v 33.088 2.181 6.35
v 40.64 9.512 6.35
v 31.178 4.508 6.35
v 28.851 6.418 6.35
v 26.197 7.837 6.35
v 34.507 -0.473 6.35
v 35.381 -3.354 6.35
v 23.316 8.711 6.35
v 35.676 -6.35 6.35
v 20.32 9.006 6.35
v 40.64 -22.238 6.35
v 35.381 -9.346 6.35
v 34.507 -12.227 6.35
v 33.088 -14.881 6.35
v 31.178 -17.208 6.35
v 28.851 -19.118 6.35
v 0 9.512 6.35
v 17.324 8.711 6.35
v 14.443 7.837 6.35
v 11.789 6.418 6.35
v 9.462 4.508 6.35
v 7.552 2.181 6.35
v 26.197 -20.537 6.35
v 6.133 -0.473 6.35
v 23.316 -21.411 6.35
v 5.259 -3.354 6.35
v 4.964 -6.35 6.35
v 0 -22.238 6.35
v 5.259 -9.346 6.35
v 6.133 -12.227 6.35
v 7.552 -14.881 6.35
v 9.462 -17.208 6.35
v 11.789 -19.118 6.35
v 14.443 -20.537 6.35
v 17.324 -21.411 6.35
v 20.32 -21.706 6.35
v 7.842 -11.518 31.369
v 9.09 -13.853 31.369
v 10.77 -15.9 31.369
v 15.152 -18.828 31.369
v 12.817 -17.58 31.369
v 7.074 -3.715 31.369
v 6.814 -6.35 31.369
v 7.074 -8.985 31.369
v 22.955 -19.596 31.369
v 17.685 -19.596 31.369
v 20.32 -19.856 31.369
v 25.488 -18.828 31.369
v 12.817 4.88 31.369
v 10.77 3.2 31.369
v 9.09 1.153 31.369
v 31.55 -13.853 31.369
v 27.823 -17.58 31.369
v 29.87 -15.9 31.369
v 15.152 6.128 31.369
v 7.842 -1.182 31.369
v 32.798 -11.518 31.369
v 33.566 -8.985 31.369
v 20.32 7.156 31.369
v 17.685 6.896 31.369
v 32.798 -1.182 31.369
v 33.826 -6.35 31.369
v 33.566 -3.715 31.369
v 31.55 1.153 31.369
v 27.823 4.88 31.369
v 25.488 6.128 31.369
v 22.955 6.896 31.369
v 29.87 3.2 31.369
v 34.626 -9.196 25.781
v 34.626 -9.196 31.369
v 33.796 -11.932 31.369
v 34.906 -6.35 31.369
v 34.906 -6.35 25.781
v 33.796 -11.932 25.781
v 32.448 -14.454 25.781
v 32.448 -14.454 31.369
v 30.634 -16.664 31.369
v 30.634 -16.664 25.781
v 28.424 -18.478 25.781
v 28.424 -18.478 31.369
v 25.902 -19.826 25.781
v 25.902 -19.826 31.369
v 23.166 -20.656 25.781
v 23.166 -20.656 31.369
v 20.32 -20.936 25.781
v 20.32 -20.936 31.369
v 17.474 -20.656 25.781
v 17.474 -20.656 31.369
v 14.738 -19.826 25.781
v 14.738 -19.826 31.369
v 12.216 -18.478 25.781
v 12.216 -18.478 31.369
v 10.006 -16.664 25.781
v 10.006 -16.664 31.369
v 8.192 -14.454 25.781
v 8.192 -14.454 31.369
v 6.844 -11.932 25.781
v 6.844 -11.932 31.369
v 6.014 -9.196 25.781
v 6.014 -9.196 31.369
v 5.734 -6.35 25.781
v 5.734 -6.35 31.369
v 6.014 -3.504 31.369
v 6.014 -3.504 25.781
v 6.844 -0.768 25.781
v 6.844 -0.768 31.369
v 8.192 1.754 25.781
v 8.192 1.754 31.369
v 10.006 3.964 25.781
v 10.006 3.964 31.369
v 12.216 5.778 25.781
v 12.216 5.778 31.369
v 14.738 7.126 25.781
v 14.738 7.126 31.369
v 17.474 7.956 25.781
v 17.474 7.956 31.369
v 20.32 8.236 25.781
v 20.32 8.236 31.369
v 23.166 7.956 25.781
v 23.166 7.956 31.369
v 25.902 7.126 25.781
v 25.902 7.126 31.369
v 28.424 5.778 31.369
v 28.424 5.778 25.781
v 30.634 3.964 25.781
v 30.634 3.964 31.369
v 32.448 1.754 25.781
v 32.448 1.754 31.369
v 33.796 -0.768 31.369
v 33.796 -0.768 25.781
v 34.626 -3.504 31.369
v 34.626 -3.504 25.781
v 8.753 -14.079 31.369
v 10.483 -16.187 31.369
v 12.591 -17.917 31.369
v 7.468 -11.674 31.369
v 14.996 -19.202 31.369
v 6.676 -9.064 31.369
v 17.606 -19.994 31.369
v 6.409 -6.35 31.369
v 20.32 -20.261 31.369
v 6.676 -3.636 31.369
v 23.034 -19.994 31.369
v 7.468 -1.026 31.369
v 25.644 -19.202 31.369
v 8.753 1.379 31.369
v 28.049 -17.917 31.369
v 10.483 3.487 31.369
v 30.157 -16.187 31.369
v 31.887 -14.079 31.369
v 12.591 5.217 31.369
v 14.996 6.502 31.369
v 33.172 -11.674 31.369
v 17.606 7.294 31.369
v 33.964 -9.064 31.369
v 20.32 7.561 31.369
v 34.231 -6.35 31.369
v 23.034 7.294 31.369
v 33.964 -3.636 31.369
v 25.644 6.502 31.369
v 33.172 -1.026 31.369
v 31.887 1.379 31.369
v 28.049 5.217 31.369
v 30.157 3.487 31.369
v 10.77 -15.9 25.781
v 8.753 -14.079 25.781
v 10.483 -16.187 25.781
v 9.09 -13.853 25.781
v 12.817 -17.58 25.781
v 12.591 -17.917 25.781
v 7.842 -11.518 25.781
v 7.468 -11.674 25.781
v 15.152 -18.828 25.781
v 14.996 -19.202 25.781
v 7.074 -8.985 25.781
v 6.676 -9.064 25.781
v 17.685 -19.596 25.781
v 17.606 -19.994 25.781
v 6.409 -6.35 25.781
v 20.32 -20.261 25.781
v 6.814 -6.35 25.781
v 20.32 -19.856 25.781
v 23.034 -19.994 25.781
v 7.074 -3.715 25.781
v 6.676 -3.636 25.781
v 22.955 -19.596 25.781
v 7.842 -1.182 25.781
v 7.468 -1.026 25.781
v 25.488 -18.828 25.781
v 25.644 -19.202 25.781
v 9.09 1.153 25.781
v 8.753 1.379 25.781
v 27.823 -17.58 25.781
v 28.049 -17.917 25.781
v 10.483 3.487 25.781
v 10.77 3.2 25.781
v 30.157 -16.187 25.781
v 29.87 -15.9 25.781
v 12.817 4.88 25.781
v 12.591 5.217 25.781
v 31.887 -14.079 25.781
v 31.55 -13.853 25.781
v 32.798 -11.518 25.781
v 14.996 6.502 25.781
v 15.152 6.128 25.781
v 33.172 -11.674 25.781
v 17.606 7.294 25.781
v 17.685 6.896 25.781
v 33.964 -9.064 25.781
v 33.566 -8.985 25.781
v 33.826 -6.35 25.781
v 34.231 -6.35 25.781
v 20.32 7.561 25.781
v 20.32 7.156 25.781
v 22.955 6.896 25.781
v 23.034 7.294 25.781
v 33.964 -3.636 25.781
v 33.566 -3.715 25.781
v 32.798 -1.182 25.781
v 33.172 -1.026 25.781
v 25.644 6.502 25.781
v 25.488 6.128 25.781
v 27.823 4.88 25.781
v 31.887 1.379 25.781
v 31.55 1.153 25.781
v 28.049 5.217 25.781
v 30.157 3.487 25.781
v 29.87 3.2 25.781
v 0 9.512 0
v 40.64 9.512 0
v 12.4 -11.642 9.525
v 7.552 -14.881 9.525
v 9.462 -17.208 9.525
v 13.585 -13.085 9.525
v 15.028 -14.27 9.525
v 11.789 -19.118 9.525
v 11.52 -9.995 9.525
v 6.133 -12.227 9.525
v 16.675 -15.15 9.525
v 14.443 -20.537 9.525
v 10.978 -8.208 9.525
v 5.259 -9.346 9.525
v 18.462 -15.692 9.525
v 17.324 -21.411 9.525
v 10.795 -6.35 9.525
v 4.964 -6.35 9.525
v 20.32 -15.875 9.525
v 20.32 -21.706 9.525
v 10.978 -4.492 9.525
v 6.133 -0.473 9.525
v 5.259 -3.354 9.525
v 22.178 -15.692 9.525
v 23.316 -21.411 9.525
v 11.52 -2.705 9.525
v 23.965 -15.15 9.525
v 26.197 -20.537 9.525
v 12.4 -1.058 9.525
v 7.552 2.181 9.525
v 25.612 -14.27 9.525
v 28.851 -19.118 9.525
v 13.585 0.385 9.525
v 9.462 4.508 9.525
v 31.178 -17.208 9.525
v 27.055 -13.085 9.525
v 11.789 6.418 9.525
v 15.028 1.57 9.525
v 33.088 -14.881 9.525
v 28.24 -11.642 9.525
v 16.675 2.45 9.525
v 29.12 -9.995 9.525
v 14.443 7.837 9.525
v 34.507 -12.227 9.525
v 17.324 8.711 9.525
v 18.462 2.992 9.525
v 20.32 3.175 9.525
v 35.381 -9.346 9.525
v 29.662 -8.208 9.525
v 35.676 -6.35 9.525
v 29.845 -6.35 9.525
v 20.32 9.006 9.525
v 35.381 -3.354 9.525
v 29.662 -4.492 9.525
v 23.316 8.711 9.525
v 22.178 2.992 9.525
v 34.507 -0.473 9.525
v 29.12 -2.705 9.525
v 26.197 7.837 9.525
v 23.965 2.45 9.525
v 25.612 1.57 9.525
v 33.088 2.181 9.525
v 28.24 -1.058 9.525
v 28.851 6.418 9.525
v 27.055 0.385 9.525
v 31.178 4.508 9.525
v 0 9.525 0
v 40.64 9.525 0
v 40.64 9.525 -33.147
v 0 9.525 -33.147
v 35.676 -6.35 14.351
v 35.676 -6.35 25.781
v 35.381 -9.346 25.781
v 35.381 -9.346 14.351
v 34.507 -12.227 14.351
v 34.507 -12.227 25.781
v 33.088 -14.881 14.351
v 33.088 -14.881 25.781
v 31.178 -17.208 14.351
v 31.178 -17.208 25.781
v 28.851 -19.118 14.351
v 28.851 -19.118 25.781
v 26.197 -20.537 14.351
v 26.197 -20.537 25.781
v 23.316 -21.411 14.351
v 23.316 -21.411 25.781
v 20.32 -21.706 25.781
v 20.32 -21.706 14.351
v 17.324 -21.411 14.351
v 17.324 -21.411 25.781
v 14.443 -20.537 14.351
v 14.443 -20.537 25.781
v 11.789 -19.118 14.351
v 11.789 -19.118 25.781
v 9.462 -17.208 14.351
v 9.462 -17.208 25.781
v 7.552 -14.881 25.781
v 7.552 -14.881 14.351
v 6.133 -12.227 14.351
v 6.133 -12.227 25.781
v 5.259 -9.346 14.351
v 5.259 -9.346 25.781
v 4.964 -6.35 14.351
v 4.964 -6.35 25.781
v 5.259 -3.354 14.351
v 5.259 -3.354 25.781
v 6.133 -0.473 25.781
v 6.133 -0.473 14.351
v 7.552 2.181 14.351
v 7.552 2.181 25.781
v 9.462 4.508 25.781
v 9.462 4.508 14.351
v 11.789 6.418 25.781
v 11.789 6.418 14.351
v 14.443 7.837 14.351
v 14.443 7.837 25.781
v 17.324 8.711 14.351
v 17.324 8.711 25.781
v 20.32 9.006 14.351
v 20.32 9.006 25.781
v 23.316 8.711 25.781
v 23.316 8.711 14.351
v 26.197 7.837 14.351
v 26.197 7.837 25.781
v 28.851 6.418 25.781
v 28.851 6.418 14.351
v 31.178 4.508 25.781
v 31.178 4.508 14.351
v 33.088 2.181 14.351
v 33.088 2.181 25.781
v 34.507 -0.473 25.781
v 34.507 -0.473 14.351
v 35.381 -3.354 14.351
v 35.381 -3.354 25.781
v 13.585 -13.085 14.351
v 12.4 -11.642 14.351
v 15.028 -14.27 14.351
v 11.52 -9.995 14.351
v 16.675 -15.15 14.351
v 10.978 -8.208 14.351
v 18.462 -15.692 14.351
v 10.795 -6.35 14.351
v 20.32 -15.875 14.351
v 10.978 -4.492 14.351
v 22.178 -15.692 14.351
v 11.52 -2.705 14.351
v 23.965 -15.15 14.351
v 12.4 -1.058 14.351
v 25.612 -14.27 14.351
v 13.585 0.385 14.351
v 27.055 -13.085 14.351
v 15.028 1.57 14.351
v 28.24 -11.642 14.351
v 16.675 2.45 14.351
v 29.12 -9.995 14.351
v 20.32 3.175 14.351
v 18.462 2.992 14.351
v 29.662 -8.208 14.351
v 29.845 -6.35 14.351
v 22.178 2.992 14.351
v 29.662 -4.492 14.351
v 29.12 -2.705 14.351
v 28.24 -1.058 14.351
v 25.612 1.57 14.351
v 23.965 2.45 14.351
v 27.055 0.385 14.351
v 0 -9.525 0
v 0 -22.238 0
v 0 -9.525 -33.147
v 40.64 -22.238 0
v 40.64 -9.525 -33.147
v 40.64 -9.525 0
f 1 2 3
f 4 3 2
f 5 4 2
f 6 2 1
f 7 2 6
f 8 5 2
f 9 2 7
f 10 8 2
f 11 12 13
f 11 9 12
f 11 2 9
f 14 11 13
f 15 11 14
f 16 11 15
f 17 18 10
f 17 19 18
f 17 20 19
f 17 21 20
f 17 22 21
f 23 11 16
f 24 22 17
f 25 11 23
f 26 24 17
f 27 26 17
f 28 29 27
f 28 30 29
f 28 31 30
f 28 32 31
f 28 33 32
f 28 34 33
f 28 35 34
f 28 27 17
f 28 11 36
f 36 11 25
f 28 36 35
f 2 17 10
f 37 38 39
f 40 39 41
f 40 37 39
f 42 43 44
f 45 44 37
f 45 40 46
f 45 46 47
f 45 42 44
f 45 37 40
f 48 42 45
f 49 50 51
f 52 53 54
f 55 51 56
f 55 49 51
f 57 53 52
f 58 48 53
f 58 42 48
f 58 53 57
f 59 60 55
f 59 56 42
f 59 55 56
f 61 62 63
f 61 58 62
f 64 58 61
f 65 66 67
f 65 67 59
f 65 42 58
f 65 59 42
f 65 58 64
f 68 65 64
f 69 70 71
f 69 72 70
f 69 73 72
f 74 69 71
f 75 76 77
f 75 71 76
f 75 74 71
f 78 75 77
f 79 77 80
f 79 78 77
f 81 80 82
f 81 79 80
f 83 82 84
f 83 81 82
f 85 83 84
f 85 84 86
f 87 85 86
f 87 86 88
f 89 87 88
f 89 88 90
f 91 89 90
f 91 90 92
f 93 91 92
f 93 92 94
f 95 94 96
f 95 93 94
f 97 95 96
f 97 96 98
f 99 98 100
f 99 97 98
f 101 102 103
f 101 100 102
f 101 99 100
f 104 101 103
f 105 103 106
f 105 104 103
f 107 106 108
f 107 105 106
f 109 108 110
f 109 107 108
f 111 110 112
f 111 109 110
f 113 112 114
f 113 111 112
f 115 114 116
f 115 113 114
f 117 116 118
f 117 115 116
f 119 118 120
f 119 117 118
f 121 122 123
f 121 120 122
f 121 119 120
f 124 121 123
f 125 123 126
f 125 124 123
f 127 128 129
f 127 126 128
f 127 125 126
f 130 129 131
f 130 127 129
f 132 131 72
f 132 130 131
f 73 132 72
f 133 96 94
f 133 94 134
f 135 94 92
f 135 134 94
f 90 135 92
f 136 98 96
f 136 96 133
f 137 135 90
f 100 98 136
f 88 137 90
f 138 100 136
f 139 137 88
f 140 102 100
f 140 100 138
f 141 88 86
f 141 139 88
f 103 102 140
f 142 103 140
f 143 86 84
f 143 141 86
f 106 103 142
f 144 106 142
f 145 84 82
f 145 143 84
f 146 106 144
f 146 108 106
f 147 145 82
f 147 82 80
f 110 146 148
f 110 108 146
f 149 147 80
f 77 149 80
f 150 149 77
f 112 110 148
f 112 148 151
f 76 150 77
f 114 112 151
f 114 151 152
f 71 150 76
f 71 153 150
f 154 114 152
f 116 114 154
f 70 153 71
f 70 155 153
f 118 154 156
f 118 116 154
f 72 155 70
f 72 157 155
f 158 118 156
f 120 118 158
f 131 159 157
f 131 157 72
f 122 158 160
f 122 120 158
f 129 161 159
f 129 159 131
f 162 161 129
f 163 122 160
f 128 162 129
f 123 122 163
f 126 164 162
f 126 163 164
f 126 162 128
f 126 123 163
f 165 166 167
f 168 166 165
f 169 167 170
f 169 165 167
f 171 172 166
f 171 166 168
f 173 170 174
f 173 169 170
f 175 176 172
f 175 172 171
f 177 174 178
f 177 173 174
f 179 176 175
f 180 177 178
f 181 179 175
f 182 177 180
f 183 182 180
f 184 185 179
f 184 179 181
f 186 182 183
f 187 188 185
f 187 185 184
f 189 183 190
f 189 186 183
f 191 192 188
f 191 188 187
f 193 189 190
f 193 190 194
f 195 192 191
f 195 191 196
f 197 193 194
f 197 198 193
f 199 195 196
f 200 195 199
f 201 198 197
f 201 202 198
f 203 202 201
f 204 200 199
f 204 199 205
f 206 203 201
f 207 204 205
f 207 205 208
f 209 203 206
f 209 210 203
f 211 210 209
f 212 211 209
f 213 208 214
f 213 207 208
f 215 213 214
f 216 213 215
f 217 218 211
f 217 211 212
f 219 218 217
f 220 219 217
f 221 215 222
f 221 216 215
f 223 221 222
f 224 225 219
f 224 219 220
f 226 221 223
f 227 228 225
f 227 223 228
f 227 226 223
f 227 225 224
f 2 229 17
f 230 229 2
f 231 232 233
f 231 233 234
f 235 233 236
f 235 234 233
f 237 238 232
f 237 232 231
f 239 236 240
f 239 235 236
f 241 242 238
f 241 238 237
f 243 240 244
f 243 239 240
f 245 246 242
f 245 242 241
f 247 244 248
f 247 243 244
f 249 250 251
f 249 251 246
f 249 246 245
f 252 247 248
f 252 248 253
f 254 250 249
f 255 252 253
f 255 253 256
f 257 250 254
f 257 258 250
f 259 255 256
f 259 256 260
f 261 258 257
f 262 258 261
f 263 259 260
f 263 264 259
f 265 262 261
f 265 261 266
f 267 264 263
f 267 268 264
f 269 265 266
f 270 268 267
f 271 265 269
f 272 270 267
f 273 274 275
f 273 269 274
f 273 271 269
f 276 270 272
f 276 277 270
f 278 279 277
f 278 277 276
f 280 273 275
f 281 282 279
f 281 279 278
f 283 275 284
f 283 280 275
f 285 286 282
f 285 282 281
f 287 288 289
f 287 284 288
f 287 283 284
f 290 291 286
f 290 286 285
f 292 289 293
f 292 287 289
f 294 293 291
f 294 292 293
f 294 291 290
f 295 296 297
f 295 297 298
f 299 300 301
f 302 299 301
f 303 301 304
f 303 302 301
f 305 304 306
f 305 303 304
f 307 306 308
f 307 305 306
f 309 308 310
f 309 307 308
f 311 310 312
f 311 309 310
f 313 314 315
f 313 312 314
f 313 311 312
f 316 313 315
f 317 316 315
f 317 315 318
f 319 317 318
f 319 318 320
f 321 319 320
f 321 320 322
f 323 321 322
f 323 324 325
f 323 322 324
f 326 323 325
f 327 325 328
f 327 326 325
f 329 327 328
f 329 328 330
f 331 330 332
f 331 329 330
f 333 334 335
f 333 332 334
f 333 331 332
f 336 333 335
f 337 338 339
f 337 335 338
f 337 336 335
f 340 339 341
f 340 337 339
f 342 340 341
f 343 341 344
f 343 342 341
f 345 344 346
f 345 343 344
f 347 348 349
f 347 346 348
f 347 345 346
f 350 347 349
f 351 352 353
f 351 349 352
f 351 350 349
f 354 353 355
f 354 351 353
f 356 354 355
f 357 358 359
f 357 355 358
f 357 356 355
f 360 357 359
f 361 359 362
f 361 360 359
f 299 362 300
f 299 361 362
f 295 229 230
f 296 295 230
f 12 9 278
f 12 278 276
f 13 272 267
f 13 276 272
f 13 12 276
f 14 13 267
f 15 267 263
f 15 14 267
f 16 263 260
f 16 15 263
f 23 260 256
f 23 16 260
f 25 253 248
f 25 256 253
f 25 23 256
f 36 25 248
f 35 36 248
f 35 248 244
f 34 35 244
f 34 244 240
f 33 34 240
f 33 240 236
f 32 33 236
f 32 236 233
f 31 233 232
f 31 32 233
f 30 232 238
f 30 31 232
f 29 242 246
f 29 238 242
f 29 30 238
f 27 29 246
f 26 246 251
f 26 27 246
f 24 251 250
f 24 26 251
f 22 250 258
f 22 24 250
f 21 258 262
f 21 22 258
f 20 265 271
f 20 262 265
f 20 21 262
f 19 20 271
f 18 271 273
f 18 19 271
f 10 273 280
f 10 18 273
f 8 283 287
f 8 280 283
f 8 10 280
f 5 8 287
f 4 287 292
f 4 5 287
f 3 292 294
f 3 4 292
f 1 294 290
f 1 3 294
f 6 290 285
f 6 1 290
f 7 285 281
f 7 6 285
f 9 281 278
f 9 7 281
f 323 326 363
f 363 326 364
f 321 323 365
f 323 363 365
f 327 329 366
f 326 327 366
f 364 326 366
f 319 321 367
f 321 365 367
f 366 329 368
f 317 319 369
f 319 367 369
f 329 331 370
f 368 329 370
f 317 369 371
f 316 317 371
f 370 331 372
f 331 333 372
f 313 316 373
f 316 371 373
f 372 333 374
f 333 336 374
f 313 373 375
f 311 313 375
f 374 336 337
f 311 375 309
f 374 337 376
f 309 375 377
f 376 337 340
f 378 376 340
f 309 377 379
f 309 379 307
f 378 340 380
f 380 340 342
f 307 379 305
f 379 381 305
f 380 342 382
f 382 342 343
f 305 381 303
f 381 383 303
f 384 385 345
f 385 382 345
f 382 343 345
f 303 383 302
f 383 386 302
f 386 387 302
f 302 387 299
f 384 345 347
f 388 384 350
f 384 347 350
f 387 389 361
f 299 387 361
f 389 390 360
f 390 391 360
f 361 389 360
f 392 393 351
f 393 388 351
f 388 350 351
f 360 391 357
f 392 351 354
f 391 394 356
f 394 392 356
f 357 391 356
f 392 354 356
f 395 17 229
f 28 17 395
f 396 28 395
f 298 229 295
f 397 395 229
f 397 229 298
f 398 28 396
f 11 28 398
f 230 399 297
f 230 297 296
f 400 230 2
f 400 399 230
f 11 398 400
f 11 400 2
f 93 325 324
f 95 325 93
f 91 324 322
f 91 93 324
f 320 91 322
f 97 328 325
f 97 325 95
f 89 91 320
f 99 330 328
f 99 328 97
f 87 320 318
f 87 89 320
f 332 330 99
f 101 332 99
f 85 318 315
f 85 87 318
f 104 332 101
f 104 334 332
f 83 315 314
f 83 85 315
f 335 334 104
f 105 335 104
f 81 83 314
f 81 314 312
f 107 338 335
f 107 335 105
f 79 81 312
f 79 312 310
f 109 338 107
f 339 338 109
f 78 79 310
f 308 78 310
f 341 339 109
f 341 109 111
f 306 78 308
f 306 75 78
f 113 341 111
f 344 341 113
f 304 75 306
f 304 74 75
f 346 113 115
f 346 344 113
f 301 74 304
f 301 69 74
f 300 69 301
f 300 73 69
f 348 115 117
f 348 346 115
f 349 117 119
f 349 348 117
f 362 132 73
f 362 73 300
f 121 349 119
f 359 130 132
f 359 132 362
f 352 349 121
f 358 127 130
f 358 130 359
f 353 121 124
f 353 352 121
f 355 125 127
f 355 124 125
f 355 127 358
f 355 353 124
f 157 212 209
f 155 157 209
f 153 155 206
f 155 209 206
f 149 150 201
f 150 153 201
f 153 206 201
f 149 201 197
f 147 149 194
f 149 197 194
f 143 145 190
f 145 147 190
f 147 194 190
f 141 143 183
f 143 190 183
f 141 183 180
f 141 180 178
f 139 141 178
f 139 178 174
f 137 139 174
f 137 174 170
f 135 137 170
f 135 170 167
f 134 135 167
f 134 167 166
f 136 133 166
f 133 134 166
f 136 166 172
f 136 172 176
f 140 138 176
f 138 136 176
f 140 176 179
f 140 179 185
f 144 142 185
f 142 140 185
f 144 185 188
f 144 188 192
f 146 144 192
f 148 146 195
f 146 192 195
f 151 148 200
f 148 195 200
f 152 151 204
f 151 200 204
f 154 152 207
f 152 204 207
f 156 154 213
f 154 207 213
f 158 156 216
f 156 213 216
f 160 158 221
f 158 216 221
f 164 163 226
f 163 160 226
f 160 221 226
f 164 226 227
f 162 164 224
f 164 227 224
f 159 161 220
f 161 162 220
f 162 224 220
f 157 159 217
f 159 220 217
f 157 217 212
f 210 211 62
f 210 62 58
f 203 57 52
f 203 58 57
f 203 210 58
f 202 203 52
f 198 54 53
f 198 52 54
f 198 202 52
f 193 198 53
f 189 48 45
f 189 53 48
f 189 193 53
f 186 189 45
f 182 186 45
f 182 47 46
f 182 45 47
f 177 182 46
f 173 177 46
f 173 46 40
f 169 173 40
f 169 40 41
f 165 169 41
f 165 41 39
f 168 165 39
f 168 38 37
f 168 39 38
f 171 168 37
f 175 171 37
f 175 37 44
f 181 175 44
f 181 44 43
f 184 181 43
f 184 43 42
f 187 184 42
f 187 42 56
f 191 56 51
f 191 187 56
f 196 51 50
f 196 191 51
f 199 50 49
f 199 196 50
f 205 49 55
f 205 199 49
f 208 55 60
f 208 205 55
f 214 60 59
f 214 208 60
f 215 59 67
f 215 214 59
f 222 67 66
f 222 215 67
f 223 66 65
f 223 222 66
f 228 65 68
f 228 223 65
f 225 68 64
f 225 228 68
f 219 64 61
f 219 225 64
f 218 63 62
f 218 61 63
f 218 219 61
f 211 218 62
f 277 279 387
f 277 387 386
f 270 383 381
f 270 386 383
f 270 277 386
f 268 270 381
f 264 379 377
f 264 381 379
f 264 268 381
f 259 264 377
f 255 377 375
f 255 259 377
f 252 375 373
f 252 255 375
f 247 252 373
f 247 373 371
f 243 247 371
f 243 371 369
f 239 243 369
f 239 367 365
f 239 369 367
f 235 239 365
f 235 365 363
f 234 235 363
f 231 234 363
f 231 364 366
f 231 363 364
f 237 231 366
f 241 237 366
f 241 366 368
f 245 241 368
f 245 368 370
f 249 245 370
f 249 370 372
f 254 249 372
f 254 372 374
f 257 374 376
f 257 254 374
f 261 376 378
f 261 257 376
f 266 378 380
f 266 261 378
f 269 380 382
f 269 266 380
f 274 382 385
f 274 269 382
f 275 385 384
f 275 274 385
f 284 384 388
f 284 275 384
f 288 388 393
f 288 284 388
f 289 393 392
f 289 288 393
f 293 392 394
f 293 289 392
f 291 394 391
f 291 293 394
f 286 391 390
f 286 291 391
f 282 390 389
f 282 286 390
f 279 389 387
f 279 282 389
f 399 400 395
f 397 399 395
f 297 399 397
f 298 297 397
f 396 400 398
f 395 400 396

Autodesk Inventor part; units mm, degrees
ref_plane "YZ Plane" through (0, 0, 0) normal (1, 0, 0) x (0, 1, 0)
ref_plane "XZ Plane" through (0, 0, 0) normal (0, 1, 0) x (-1, 0, 0)
ref_plane "XY Plane" through (0, 0, 0) normal (0, 0, 1) x (1, 0, 0)
sketch "Sketch1" plane through (0, 0, 0) normal (0, 1, 0) x (-1, 0, 0)
  line L0 (0, 0) -> (-40.64, 0)
  line L1 (-40.64, 0) -> (-40.64, -33.147)
  line L2 (-40.64, -33.147) -> (0, -33.147)
  line L3 (0, -33.147) -> (0, 0)
  dimension "d0" = 40.64
  dimension "d1" = 33.147
extrude "Extrusion1" add sketch "Sketch1" along normal mid plane 19.05
sketch "Sketch2" plane through (0, -9.525, 0) normal (0, 0, 1) x (1, 0, 0)
  line L0 (0, -6.3625) -> (40.64, -6.3625)
  line L1 (40.64, -6.3625) -> (40.64, 12.6875)
  line L2 (40.64, 12.6875) -> (0, 12.6875)
  line L3 (0, 12.6875) -> (0, -6.3625)
  point P0 (0, 9.525)
  dimension "d4" = 40.64
  dimension "d5" = 19.05
extrude "Extrusion2" add sketch "Sketch2" along normal blind 6.35
sketch "Sketch3" plane through (0, -9.525, 6.35) normal (0, 0, 1) x (1, 0, 0)
  line L0 (40.64, 12.6875) -> (0, 12.6875) projected
  point P0 (0, 9.525)
sketch "Sketch7" plane through (0, -9.525, 6.35) normal (0, 0, 1) x (1, 0, 0)
  point P0 (0, 9.525)
sketch "Sketch8" plane through (0, -15.8875, 0) normal (0, -1, 0) x (1, 0, 0)
  line L0 (40.64, 6.35) -> (0, 6.35) projected
  line L1 (40.64, 0) -> (0, 0) projected
  line L2 (0, 6.35) -> (40.64, 6.35)
  line L3 (40.64, 6.35) -> (40.64, 0)
  line L4 (40.64, 0) -> (0, 0)
  line L5 (0, 0) -> (0, 6.35)
extrude "Extrusion5" add sketch "Sketch8" along normal blind 6.35
sketch "Sketch9" plane through (0, 3.1625, 0) normal (0, 1, 0) x (1, 0, 0)
  line L0 (40.64, 0) -> (40.64, -6.35) projected
  line L1 (0, 33.147) -> (0, 0) projected
  line L2 (40.64, -6.35) -> (0, -6.35)
  line L3 (0, -6.35) -> (0, 0)
  line L4 (0, 0) -> (40.64, 0)
  line L5 (40.64, 0) -> (40.64, -6.35)
extrude "Extrusion6" add sketch "Sketch9" along normal blind 6.35
sketch "Sketch10" plane through (0, -9.525, 6.35) normal (0, 0, 1) x (1, 0, 0)
  line L0 (0, 9.525) -> (0, 19.05) projected
  circle A0 centre (20.32, 3.175) radius 15.3561
extrude "Extrusion7" add sketch "Sketch10" along normal blind 3.175
sketch "Sketch11" plane through (20.32, -6.35, 9.525) normal (0, 0, 1) x (1, 0, 0)
  circle A0 centre (0, 0) radius 9.525
  point P0 (-20.32, 6.35)
  dimension "d27" = 19.05
extrude "Extrusion8" add sketch "Sketch11" along normal blind 4.826
sketch "Sketch12" plane through (20.32, -6.35, 14.351) normal (0, 0, 1) x (1, 0, 0)
  circle A0 centre (0, 0) radius 15.3561
  point P0 (-20.32, 6.35)
extrude "Extrusion9" add sketch "Sketch12" along normal blind 11.43
sketch "Sketch13" plane through (20.32, -6.35, 25.781) normal (0, 0, 1) x (1, 0, 0)
  circle A0 centre (0, 0) radius 14.5863
  circle A1 centre (0, 0) radius 13.9111
  point P0 (-20.32, 6.35)
extrude "Extrusion10" add sketch "Sketch13" along normal blind 5.588
sketch "Sketch14" plane through (20.32, -6.35, 25.781) normal (0, 0, 1) x (1, 0, 0)
  circle A0 centre (0, 0) radius 13.5059
  point P0 (-20.32, 6.35)
extrude "Extrusion11" add sketch "Sketch14" along normal blind 5.588
thread "Thread3" size "2-56 UNC" class "2A" standard "ANSI Unified Screw Threads" full length
properties part number "imdreset"
